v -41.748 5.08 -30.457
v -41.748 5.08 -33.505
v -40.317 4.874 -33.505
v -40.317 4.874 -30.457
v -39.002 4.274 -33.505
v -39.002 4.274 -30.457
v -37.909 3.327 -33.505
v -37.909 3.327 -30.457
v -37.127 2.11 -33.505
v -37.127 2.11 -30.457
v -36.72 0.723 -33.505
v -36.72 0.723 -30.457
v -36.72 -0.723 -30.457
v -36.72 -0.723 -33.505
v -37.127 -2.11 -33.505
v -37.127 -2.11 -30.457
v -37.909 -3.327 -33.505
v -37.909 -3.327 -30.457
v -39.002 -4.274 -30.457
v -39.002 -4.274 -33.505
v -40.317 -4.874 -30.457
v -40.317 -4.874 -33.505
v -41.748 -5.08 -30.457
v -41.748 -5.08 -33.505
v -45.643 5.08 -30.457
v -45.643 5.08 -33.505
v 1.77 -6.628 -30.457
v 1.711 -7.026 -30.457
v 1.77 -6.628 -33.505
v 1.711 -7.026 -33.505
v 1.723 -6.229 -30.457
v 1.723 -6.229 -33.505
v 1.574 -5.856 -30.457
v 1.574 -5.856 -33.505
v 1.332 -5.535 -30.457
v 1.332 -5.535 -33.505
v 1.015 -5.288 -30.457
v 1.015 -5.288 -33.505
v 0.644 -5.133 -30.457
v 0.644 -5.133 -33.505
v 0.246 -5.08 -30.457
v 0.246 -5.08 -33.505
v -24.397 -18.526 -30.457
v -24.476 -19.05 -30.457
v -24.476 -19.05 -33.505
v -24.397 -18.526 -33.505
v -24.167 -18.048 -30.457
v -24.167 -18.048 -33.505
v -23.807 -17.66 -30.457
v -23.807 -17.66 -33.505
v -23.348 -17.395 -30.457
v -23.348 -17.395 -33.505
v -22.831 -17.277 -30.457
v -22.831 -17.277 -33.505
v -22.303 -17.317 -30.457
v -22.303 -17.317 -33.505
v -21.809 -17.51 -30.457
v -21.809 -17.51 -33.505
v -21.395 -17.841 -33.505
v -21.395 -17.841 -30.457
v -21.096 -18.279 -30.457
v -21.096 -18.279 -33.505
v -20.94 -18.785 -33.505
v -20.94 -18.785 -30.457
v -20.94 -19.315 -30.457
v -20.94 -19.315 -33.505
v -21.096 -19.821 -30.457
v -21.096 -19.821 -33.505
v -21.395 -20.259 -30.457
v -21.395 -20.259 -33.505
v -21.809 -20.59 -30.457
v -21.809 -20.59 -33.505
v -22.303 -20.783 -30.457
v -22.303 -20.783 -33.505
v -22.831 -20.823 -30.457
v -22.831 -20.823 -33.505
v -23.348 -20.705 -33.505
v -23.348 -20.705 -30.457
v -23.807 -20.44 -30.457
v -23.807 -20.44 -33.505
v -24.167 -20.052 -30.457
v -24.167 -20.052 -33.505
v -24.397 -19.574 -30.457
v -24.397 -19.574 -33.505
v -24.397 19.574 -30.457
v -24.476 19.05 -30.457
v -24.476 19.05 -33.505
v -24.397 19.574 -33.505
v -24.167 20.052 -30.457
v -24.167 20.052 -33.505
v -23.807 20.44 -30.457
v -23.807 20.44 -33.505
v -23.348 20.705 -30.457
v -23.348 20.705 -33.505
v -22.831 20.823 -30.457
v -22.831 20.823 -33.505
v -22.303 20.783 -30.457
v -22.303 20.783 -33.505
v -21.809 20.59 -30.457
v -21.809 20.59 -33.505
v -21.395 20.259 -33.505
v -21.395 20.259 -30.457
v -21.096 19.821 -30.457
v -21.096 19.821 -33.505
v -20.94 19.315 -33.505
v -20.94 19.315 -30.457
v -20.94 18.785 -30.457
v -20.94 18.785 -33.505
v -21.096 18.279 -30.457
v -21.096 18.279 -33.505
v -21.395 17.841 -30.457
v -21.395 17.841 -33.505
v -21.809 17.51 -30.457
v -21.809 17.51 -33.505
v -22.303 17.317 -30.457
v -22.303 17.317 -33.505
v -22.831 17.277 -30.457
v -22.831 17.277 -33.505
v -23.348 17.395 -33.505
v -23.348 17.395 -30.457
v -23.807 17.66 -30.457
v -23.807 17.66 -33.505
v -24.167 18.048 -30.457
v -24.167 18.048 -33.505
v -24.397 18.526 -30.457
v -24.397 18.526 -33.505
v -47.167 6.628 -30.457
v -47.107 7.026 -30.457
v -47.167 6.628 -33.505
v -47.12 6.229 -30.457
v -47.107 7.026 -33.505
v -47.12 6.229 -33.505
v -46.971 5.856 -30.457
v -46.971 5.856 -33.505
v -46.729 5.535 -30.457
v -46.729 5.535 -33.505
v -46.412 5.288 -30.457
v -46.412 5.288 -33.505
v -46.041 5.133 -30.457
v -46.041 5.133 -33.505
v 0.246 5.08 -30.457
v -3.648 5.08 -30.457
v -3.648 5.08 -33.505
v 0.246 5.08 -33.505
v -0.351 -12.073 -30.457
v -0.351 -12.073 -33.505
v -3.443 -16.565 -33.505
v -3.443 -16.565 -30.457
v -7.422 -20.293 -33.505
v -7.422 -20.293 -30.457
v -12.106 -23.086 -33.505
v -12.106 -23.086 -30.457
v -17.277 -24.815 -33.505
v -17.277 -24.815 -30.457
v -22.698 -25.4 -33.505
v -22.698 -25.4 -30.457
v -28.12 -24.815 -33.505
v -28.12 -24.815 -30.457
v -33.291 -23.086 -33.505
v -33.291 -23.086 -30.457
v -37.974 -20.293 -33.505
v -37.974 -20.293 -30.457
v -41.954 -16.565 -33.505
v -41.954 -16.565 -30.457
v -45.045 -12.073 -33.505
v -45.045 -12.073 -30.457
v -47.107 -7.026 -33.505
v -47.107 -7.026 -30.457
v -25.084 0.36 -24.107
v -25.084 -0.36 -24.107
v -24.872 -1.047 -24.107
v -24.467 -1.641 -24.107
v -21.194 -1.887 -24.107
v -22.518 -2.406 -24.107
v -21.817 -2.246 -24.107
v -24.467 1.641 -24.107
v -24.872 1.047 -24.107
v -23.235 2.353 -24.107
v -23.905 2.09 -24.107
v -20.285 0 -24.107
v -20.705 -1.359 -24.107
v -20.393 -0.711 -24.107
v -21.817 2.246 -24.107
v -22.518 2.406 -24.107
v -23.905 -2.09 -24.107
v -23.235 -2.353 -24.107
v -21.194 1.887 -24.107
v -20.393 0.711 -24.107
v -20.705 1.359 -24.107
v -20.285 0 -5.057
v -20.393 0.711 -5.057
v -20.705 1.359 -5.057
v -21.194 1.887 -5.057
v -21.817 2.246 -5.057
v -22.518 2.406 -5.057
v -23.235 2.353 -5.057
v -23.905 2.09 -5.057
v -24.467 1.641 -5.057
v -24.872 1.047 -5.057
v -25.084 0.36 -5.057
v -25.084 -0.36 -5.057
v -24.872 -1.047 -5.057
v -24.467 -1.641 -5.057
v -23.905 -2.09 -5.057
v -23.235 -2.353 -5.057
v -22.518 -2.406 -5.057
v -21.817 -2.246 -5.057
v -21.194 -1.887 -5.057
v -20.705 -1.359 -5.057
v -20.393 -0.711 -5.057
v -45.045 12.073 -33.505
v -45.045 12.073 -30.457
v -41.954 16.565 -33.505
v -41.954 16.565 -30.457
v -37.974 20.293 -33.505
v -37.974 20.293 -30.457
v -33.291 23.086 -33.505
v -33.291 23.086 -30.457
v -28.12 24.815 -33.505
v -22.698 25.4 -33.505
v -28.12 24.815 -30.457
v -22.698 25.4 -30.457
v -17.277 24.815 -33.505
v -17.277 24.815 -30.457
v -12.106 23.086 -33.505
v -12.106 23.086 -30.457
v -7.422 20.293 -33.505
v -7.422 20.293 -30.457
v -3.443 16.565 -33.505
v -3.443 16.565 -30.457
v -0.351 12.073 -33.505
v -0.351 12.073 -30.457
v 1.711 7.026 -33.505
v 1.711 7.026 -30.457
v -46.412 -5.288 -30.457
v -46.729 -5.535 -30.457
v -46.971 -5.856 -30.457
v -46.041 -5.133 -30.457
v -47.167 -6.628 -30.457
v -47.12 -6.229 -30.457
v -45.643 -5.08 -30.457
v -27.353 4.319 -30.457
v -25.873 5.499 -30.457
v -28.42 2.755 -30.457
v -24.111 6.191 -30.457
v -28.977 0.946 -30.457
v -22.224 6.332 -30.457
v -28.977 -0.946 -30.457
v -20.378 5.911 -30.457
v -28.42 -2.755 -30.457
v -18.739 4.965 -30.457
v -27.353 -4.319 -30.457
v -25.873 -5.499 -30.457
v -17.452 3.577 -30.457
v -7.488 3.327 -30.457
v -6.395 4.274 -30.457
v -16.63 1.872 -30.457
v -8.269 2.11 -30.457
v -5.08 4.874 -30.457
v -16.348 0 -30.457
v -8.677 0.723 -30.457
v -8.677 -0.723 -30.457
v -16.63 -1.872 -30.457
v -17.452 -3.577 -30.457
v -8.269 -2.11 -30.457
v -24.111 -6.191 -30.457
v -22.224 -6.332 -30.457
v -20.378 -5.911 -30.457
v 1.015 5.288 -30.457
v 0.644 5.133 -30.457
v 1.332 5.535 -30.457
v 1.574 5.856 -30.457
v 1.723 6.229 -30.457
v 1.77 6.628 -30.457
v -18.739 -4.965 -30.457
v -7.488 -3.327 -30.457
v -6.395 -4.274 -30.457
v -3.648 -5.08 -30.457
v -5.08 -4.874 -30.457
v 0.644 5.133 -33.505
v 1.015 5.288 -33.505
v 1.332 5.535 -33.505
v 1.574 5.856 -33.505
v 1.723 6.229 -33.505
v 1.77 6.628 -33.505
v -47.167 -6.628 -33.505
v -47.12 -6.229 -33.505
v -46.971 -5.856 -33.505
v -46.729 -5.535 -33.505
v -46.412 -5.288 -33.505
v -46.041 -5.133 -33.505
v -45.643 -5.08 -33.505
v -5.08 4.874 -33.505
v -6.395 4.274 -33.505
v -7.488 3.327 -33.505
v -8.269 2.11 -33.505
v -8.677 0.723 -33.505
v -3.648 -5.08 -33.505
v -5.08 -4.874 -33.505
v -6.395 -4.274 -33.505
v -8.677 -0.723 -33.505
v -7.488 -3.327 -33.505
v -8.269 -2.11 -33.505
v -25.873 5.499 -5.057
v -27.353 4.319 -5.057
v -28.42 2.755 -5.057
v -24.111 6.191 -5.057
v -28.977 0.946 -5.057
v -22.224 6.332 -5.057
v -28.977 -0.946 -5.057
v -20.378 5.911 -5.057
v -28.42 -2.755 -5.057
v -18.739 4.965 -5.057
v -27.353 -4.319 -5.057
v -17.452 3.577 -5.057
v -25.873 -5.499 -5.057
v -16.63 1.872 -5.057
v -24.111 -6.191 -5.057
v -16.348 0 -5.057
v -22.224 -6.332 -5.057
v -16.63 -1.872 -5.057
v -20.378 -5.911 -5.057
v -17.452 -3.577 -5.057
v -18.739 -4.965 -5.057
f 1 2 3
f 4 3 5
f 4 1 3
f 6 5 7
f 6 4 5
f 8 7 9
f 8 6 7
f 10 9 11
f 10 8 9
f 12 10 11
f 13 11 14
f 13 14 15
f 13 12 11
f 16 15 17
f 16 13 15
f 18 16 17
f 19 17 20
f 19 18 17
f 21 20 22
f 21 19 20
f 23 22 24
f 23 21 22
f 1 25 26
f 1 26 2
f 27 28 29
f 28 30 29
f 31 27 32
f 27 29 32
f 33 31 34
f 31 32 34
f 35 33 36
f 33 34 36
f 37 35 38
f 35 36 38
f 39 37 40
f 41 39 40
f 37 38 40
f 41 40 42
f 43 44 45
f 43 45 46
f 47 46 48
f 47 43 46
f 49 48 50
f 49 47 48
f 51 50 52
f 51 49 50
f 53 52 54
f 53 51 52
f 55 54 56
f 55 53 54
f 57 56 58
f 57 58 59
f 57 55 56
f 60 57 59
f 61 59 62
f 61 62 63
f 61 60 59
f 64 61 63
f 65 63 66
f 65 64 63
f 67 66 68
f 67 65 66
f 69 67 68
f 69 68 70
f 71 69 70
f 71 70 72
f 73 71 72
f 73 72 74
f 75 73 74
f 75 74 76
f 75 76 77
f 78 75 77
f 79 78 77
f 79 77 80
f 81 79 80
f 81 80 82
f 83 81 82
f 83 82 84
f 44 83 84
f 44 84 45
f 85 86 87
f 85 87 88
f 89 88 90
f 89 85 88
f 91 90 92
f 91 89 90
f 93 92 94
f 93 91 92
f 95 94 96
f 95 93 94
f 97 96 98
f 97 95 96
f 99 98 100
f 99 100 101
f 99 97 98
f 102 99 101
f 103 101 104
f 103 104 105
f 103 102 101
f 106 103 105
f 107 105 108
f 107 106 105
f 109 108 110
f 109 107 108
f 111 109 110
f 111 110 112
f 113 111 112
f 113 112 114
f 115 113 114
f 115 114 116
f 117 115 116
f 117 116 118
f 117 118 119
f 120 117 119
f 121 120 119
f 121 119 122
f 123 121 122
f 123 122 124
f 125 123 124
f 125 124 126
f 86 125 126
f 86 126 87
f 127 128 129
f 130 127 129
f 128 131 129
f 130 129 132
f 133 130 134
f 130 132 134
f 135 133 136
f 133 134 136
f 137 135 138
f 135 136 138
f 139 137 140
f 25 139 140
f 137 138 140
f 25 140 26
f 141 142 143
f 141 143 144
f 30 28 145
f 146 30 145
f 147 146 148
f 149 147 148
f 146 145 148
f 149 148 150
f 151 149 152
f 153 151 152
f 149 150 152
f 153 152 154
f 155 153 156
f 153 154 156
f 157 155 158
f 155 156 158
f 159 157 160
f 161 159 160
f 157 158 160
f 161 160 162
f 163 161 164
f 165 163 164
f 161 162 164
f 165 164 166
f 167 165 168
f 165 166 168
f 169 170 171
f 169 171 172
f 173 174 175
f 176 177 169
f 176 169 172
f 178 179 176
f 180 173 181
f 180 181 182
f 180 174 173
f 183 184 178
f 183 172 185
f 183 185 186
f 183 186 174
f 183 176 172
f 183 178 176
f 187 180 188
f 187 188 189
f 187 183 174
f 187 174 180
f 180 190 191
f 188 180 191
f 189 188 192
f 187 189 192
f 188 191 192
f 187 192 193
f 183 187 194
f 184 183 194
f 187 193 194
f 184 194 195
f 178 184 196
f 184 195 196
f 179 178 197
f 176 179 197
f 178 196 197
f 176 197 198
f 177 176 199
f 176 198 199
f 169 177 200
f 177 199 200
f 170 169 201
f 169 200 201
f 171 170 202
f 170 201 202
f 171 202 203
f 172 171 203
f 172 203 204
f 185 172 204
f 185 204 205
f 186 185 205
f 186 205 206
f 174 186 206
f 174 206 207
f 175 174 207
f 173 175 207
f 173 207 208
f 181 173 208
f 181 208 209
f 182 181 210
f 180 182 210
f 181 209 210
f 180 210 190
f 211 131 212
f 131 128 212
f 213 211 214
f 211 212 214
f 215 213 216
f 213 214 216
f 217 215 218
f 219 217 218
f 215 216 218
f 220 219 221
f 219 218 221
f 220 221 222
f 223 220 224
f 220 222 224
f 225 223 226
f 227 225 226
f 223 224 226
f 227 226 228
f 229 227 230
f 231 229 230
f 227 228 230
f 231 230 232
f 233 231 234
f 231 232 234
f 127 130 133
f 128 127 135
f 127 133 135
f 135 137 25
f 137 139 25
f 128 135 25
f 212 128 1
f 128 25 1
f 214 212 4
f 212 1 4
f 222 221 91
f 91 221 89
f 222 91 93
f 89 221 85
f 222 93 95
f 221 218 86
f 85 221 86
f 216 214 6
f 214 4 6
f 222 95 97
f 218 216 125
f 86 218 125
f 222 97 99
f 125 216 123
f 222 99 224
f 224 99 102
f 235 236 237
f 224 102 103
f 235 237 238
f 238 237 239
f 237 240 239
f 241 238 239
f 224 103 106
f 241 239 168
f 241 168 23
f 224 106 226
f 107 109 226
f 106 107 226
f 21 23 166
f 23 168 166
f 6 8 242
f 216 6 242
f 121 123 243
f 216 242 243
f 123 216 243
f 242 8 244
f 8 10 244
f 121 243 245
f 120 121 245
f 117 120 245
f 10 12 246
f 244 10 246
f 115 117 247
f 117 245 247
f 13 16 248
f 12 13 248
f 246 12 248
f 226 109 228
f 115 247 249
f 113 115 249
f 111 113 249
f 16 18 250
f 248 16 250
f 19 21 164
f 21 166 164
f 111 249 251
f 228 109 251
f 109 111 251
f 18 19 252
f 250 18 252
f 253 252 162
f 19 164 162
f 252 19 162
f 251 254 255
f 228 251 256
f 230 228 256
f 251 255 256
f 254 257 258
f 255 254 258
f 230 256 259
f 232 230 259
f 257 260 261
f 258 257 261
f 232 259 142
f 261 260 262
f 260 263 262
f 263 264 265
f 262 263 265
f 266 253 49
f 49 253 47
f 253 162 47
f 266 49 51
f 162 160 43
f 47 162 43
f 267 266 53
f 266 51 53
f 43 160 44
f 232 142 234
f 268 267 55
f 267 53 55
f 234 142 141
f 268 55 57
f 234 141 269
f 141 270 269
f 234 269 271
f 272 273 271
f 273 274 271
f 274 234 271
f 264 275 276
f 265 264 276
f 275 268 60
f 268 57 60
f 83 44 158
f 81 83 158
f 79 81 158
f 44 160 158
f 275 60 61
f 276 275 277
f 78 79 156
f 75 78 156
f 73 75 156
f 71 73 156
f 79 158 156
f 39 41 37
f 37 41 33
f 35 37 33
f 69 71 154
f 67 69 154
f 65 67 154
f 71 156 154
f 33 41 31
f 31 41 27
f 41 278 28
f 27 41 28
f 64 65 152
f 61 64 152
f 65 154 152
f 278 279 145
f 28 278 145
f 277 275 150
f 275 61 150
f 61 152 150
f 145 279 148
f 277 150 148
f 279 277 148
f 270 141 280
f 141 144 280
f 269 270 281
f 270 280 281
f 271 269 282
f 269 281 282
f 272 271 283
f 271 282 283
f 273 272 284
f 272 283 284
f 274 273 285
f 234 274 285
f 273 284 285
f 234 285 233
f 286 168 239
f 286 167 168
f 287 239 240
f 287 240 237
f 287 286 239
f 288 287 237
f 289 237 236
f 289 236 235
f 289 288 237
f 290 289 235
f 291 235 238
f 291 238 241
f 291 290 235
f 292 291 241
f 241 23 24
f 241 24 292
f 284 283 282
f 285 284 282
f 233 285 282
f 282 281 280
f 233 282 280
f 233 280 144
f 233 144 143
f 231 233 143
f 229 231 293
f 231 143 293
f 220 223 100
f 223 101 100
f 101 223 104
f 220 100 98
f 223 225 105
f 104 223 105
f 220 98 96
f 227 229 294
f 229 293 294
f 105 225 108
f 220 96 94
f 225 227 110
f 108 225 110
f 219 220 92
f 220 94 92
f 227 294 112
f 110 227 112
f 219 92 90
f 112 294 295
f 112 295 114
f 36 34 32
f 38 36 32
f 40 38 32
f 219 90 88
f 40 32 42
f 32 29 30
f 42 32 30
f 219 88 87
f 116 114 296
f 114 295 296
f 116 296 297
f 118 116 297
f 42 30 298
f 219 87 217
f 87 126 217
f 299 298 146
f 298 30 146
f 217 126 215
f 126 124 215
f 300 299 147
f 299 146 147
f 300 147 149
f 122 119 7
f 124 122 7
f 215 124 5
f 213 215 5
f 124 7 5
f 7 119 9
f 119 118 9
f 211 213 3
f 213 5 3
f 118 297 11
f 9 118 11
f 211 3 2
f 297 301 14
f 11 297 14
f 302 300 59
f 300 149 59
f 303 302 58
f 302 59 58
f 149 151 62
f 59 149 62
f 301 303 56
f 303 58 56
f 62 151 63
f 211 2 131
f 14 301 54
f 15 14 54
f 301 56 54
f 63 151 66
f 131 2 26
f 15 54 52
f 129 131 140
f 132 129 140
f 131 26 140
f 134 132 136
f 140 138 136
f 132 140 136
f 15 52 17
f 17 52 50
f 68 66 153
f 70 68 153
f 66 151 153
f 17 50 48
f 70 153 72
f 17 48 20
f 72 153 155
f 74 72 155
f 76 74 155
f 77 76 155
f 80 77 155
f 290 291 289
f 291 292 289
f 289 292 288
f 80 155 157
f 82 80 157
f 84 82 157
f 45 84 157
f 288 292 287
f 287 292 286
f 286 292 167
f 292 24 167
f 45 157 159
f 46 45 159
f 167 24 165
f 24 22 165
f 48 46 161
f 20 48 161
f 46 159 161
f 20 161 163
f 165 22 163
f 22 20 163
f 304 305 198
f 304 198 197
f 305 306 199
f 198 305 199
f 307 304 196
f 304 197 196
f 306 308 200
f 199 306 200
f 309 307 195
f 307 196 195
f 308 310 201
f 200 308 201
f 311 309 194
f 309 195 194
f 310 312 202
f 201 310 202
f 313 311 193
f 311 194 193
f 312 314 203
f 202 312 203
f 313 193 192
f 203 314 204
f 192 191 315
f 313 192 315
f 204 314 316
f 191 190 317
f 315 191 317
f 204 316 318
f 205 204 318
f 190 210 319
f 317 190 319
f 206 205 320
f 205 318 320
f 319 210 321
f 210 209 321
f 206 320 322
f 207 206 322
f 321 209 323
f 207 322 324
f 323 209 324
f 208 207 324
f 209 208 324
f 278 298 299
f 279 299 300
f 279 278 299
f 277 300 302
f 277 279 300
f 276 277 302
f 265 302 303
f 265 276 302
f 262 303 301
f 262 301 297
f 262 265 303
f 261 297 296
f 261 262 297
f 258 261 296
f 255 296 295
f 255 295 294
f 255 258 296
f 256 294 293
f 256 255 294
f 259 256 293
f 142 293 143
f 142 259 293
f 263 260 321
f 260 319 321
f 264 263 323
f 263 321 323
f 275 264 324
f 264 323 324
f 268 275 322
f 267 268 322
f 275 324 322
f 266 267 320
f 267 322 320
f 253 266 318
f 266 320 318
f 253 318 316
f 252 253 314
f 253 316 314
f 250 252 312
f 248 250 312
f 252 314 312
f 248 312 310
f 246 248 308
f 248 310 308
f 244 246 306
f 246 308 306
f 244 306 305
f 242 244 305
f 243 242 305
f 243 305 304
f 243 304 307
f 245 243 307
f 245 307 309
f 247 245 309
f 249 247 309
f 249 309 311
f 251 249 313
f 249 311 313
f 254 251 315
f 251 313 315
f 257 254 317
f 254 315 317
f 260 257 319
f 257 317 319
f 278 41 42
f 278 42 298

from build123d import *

# Parameters (mm, degrees)
CUT_EXTRUDE2_START = -5.08
SKETCH2_R          = 1.778
CUT_EXTRUDE2_DEPTH = 5.08
SKETCH4_R          = 2.413
CUT_EXTRUDE3_DEPTH = 19.05
FILLET1_R          = 1.524


with BuildPart() as part:
    # Sketch1 → Revolve1 (revolve)
    with BuildSketch(Plane(origin=(0, 0, 0), x_dir=(1, 0, 0), z_dir=(0, 1, 0))):
        Polygon((2.701636364, 33.504909091), (2.701636364, 30.456909091), (-16.348363636, 30.456909091), (-16.348363636, 5.056909091), (-22.698363636, 5.056909091), (-22.698363636, 33.504909091), align=None)
    revolve(axis=Axis((-22.698363636, 0, -5.056909091), (0, 0, -1)))

    # Sketch2 → Cut-Extrude2 (cut)
    with BuildSketch(Plane(origin=(0, 0, -33.504909091), x_dir=(-1, 0, 0), z_dir=(0, 0, -1)).offset(CUT_EXTRUDE2_START)):
        with Locations((22.698363636, -19.05)):
            Circle(SKETCH2_R)
        with Locations((22.698363636, 19.05)):
            Circle(SKETCH2_R)
        with BuildLine():
            Line((41.748363636, -5.08), (47.585179423, -5.08))
            ThreePointArc((47.585179423, -5.08), (48.098363636, 0), (47.585179423, 5.08))
            Line((47.585179423, 5.08), (41.748363636, 5.08))
            ThreePointArc((41.748363636, 5.08), (36.668363636, 0), (41.748363636, -5.08))
        make_face()
        with BuildLine():
            Line((3.648363636, 5.08), (-2.18845215, 5.08))
            ThreePointArc((-2.18845215, 5.08), (-2.701636364, 0), (-2.18845215, -5.08))
            Line((-2.18845215, -5.08), (3.648363636, -5.08))
            ThreePointArc((3.648363636, -5.08), (8.728363636, 0), (3.648363636, 5.08))
        make_face()
    extrude(amount=CUT_EXTRUDE2_DEPTH, mode=Mode.SUBTRACT)

    # Sketch4 → Cut-Extrude3 (cut)
    with BuildSketch(Plane.XY.offset(-5.056909091)):
        with Locations((-22.698363636, 0)):
            Circle(SKETCH4_R)
    extrude(amount=-CUT_EXTRUDE3_DEPTH, mode=Mode.SUBTRACT)

    # Fillet1
    fillet1_edges = [part.edges().sort_by_distance(p)[0] for p in [
        (-47.585179423, 5.08, -31.980909091),
        (-47.585179423, -5.08, -31.980909091),
        (2.18845215, -5.08, -31.980909091),
        (2.18845215, 5.08, -31.980909091),
    ]]
    fillet(fillet1_edges, radius=FILLET1_R)


solid = part.part
